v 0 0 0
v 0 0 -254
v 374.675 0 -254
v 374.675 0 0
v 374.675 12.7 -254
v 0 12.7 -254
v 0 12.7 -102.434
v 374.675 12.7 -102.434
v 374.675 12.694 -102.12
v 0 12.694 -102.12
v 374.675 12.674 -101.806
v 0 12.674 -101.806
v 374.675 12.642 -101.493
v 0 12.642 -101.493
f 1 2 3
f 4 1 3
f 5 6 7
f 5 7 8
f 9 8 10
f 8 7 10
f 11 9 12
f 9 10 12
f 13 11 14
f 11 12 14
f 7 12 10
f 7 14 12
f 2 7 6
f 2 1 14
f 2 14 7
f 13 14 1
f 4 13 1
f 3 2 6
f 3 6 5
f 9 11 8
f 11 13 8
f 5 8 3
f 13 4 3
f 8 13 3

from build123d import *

# Parameters (mm, degrees)
SKETCH2_W           = 374.6754
SKETCH2_H           = 254
BOSS_EXTRUDE2_DEPTH = 12.7
CUT_EXTRUDE1_DEPTH  = 453.834346495
FILLET1_R           = 7.62


with BuildPart() as part:
    # Sketch2 → Boss-Extrude2 (new body)
    with BuildSketch(Plane(origin=(0, 0, 0), x_dir=(1, 0, 0), z_dir=(0, 1, 0))):
        with Locations((187.3377, 127)):
            Rectangle(SKETCH2_W, SKETCH2_H)
    extrude(amount=BOSS_EXTRUDE2_DEPTH)

    # Sketch4 → Cut-Extrude1 (cut, through all)
    with BuildSketch(Plane(origin=(374.6754, 0, 0), x_dir=(0, 0, -1), z_dir=(1, 0, 0))):
        Polygon((101.961691264, 12.7), (0, 0), (0, 12.7), align=None)
    extrude(amount=-CUT_EXTRUDE1_DEPTH, mode=Mode.SUBTRACT)

    # Fillet1
    fillet1_edges = [part.edges().sort_by_distance(p)[0] for p in [
        (187.3377, 12.7, -101.961691264),
    ]]
    fillet(fillet1_edges, radius=FILLET1_R)


solid = part.part
